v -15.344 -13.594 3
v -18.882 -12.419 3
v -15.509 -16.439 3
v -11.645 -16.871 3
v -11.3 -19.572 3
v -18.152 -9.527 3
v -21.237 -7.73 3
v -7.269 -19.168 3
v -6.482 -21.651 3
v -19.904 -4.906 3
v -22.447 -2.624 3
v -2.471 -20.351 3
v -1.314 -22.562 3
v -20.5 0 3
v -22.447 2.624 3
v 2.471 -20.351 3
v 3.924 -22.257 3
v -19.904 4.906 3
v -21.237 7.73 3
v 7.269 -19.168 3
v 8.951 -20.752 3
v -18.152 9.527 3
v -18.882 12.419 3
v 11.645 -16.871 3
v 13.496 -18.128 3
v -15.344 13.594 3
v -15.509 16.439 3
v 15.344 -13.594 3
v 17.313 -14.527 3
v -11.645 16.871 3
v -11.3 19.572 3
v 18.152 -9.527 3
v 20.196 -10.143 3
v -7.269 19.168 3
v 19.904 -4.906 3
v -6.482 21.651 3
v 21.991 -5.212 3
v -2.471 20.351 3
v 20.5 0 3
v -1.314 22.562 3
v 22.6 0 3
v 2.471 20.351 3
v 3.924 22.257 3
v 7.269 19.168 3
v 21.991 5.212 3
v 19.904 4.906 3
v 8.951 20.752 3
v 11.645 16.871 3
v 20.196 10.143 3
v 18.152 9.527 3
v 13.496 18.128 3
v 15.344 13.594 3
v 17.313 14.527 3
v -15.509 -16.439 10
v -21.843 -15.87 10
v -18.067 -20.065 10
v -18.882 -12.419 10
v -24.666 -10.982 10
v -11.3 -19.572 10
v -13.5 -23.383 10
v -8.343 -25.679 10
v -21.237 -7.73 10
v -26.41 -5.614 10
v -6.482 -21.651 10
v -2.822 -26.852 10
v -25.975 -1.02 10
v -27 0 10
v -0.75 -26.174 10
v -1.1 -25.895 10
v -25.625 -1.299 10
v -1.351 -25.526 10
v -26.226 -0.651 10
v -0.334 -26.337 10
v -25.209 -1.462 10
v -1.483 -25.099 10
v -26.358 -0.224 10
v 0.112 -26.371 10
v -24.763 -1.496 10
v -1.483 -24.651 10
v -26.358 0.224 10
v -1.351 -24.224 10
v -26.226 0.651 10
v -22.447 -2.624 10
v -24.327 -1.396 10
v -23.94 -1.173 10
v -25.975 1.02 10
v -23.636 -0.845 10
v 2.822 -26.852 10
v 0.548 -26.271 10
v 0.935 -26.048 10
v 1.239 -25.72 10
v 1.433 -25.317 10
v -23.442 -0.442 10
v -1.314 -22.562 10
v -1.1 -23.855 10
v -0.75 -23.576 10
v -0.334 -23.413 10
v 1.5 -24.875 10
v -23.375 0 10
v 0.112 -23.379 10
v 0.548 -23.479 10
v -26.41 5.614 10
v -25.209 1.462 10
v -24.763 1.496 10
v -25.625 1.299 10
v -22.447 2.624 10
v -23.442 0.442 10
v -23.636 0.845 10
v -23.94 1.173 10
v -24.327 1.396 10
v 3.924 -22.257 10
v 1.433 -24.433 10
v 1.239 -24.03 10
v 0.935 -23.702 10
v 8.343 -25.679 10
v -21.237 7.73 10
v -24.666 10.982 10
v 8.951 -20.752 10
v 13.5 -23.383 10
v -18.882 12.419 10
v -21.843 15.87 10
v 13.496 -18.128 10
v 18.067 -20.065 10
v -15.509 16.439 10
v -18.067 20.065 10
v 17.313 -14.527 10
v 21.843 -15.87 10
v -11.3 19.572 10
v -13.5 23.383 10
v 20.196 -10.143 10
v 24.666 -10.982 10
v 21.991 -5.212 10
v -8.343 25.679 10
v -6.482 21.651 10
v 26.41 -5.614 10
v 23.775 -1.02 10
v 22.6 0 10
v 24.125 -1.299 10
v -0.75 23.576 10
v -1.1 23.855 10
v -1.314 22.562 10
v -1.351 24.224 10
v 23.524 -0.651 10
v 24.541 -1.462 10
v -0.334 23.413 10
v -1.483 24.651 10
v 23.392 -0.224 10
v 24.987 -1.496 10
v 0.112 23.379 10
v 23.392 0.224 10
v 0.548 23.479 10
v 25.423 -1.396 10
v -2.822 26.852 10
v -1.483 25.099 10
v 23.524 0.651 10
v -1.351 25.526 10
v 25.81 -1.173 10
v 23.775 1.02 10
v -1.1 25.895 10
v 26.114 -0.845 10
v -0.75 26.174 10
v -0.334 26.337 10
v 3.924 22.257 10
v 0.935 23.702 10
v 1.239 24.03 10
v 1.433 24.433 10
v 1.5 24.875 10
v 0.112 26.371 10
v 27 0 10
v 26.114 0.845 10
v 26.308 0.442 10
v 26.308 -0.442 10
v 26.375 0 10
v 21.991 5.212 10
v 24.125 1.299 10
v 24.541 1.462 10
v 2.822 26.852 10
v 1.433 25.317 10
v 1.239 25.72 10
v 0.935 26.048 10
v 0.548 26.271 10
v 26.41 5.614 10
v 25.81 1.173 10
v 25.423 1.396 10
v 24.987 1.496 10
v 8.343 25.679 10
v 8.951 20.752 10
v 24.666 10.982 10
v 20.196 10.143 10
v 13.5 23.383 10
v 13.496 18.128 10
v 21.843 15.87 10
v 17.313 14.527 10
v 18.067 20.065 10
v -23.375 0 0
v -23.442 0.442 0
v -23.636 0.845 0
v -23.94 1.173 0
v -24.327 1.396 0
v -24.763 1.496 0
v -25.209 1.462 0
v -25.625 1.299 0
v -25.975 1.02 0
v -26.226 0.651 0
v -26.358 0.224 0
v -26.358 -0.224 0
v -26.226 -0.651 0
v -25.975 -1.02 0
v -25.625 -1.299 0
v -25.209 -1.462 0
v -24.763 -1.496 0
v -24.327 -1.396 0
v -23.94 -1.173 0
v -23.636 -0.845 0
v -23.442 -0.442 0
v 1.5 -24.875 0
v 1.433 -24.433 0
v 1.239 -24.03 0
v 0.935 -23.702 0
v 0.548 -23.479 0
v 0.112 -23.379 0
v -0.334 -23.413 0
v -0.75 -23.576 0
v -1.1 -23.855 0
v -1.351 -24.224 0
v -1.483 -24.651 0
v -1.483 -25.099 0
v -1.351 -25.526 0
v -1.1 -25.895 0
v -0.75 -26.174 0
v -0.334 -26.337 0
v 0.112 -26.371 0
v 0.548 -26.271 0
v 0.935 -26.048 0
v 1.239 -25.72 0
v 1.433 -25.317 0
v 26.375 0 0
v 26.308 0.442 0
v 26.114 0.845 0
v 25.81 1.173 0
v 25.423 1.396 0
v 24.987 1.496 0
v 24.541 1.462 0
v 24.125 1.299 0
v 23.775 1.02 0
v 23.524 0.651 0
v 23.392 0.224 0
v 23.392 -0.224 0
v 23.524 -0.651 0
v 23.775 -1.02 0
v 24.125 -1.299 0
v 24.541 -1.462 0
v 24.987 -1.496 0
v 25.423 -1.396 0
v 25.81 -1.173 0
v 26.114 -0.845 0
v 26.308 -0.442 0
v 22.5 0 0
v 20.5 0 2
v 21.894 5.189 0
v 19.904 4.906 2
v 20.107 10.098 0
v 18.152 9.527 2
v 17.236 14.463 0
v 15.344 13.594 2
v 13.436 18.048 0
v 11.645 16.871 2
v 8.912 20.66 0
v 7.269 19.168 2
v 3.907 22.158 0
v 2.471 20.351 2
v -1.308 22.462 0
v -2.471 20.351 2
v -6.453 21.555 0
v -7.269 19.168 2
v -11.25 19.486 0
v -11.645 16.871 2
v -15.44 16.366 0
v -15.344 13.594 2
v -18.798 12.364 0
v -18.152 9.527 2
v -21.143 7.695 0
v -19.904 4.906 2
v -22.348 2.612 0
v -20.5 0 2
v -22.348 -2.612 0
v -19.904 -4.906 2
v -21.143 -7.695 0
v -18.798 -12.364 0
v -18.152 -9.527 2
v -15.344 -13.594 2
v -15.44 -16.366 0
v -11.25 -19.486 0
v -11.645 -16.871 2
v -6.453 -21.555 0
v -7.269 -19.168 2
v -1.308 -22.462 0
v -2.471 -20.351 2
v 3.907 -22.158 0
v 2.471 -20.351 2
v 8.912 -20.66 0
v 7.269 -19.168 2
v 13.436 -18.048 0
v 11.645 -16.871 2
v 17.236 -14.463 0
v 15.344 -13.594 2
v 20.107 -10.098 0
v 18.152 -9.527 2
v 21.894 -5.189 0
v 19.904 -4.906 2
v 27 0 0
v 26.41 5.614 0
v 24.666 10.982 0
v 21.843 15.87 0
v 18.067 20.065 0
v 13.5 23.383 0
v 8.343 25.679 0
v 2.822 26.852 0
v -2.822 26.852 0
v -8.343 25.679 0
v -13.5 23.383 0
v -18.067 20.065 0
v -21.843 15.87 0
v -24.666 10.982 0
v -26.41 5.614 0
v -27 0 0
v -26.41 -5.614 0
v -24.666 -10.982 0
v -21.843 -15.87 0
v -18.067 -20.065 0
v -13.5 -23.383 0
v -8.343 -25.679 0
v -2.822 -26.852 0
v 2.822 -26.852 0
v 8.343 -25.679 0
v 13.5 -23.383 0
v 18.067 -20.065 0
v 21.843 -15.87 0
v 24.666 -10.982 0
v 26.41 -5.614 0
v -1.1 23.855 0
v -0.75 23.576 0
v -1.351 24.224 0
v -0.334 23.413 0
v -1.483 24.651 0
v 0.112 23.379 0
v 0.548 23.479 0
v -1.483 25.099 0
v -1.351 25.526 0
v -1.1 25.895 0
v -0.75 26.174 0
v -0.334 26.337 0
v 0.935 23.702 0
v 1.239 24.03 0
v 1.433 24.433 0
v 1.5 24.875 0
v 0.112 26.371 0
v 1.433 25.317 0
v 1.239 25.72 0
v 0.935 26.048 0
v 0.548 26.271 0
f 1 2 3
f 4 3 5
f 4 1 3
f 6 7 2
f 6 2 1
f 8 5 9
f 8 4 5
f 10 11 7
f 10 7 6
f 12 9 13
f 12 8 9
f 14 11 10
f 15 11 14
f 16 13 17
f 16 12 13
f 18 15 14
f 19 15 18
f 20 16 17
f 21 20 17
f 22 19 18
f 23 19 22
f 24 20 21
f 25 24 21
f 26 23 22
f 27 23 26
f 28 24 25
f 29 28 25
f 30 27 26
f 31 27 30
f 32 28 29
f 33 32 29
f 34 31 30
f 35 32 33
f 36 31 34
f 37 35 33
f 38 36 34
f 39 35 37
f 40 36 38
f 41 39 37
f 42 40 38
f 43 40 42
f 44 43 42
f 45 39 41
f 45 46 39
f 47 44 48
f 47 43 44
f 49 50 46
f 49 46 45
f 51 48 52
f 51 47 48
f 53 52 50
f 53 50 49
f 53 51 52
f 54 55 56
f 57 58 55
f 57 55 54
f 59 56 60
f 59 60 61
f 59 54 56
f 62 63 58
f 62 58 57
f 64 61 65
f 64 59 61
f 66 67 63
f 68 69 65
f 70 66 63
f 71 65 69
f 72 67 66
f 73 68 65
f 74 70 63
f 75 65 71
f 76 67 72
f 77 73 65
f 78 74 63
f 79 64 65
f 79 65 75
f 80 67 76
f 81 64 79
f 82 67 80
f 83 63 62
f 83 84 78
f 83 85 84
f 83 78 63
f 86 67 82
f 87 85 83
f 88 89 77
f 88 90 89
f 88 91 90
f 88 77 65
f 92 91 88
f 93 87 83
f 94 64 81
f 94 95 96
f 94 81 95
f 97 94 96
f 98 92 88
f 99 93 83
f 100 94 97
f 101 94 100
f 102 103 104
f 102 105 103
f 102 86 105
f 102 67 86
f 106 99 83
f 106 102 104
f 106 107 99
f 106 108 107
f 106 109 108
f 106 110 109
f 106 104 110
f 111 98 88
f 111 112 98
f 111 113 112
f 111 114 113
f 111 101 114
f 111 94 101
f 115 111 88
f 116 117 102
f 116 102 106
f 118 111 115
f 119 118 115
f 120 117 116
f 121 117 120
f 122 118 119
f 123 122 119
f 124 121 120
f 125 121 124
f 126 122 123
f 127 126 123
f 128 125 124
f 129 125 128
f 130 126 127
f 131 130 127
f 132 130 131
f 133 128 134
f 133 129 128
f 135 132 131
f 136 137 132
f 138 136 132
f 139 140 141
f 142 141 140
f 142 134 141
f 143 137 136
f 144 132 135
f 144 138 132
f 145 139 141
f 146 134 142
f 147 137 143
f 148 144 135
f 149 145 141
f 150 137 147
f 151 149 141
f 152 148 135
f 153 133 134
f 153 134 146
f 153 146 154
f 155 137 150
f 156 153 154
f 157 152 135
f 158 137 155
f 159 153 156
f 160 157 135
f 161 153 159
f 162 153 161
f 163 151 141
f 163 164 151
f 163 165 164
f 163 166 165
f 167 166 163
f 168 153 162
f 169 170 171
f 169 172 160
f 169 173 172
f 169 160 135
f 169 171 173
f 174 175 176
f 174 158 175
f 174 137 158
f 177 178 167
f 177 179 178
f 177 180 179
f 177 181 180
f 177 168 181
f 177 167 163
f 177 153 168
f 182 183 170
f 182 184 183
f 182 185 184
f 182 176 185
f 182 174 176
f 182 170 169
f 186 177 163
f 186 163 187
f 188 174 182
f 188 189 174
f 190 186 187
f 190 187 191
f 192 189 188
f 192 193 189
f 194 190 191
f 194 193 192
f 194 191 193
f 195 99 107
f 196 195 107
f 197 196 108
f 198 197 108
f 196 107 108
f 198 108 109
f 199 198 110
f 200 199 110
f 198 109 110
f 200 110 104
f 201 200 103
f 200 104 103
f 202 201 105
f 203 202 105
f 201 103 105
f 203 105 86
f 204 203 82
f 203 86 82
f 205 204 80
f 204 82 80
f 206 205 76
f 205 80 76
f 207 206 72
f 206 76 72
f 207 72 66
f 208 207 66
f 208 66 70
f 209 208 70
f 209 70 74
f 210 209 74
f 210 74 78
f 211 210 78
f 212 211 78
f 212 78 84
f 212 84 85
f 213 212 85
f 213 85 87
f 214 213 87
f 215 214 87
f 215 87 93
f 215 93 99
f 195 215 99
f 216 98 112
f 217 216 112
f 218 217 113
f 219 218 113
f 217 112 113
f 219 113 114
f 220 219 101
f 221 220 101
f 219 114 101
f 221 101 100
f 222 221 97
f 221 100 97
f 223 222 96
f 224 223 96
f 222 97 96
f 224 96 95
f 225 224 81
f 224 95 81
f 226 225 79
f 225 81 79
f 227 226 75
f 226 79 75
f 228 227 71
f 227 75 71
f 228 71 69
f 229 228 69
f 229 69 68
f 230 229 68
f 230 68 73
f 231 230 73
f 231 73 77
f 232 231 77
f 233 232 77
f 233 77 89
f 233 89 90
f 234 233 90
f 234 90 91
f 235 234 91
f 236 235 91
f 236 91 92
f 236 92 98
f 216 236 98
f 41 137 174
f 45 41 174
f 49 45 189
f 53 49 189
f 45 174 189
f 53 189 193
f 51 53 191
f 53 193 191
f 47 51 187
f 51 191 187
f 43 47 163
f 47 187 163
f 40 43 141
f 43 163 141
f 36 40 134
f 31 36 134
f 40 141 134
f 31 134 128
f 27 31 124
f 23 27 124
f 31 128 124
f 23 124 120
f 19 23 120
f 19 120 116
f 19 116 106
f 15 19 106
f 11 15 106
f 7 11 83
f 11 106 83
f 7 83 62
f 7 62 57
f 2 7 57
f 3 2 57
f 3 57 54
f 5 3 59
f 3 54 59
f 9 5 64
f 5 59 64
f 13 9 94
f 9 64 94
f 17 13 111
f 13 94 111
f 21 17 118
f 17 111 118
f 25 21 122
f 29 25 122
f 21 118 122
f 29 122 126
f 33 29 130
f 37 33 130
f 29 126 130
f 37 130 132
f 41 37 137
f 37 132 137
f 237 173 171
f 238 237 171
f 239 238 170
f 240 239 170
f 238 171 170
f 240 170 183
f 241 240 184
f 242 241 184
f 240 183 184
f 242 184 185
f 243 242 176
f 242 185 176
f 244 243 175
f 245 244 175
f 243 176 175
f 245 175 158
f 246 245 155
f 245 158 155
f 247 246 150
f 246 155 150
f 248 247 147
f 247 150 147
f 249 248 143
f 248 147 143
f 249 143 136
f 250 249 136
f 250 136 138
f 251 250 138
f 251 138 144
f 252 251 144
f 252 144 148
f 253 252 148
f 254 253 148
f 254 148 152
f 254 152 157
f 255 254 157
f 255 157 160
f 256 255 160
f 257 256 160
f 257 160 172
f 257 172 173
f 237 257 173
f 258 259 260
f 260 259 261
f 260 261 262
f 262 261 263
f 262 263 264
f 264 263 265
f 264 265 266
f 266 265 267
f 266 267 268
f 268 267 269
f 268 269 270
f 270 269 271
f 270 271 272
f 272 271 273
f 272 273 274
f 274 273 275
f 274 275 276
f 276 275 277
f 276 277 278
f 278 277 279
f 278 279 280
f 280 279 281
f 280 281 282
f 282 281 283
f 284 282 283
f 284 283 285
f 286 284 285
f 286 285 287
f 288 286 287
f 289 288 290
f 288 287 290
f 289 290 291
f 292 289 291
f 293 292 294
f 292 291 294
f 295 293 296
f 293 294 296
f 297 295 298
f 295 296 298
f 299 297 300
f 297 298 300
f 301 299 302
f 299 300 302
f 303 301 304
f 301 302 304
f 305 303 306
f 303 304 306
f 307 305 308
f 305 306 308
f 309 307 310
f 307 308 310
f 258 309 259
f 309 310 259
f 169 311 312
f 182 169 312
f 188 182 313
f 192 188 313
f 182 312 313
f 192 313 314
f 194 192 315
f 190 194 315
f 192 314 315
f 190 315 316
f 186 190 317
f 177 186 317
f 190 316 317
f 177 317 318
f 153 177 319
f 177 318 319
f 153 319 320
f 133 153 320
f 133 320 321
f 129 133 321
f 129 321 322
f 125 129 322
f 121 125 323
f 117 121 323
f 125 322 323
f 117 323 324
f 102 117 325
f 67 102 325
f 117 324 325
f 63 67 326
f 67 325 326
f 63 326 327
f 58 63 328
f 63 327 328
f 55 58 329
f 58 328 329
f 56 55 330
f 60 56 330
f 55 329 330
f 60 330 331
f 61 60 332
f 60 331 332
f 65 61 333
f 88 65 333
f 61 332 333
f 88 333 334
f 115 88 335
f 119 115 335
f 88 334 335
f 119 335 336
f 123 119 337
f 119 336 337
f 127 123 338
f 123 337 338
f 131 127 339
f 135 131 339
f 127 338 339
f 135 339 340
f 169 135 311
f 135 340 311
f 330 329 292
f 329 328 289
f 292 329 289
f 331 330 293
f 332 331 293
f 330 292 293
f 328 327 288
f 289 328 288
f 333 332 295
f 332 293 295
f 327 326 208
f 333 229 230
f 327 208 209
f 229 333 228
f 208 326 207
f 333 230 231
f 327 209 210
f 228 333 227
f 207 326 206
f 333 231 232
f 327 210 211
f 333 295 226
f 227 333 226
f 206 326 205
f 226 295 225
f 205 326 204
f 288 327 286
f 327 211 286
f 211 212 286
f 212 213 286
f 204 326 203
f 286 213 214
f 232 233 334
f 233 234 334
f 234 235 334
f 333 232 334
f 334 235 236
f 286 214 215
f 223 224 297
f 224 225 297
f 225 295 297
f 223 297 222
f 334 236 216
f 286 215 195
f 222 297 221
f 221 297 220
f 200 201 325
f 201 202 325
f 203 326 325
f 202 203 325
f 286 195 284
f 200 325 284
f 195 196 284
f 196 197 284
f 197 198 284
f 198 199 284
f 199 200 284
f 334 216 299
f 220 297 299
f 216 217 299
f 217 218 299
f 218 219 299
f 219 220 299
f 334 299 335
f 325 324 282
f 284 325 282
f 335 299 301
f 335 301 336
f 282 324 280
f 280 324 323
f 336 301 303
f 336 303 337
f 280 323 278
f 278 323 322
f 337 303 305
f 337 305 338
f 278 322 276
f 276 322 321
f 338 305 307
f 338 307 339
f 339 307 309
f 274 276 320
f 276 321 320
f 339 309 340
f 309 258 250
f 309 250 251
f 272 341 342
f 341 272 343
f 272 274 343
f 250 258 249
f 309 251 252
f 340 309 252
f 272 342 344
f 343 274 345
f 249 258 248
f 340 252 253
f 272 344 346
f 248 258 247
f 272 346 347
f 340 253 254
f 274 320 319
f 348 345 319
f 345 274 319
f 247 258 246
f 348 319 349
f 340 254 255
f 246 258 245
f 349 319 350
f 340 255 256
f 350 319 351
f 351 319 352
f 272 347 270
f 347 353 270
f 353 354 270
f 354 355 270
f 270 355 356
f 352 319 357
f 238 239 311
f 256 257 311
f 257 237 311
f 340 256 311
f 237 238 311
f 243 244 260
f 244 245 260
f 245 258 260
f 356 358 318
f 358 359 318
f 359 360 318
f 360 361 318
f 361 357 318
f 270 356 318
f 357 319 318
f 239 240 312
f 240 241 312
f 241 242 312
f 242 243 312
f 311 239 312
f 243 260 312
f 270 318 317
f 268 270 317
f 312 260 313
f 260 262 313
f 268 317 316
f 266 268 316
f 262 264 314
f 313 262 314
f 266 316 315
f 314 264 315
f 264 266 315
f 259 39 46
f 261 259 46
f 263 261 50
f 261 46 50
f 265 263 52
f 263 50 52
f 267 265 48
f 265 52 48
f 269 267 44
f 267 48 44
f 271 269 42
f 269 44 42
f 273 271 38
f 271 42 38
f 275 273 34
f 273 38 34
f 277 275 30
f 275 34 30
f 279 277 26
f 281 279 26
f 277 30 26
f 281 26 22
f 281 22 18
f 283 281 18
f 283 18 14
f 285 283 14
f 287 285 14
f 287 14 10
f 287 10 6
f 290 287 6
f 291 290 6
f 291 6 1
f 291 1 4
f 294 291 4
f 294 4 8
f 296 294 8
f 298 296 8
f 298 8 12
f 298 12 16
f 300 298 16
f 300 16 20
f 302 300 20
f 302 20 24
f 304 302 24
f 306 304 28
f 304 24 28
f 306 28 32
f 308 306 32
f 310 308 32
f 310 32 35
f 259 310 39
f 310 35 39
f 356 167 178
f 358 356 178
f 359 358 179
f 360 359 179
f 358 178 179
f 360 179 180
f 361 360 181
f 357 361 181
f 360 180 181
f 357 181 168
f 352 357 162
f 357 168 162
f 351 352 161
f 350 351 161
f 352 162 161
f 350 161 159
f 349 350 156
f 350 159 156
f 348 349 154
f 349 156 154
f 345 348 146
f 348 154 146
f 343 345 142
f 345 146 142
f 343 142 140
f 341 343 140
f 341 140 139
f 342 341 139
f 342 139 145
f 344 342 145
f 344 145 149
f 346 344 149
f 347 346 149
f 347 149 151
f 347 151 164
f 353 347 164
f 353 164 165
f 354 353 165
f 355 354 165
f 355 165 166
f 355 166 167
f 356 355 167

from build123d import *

# Parameters (mm, degrees)
F0_R     = 27
F1_DEPTH = 10
F2_R     = 22.6
F3_DEPTH = 7
F4_R     = 20.5
F5_DEPTH = 3.001
F6_R     = 1.5
F7_DEPTH = 10.001
F8_SIZE  = 2


with BuildPart() as f1:
    # F0 (on Top) → F1 (new body)
    with BuildSketch(Plane.XY):
        Circle(F0_R)
    extrude(amount=F1_DEPTH)

    # F2 (on face) → F3 (cut)
    with BuildSketch(Plane.XY.offset(10)):
        Circle(F2_R)
    extrude(amount=-F3_DEPTH, mode=Mode.SUBTRACT)

    # F4 (on face) → F5 (cut, through all)
    with BuildSketch(Plane.XY.offset(3)):
        Circle(F4_R)
    extrude(amount=-F5_DEPTH, mode=Mode.SUBTRACT)

    # F6 (on face) → F7 (cut, through all)
    with BuildSketch(Plane.XY.offset(10)):
        with Locations((-24.875, 0)):
            Circle(F6_R)
        with Locations((24.875, 0)):
            Circle(F6_R)
        with Locations((0, 24.875)):
            Circle(F6_R)
        with Locations((0, -24.875)):
            Circle(F6_R)
    extrude(amount=-F7_DEPTH, mode=Mode.SUBTRACT)

    # F8
    f8_edges = [f1.edges().sort_by_distance(p)[0] for p in [
        (-20.5, 0, 0),
    ]]
    chamfer(f8_edges, length=F8_SIZE)


solid = f1.part
